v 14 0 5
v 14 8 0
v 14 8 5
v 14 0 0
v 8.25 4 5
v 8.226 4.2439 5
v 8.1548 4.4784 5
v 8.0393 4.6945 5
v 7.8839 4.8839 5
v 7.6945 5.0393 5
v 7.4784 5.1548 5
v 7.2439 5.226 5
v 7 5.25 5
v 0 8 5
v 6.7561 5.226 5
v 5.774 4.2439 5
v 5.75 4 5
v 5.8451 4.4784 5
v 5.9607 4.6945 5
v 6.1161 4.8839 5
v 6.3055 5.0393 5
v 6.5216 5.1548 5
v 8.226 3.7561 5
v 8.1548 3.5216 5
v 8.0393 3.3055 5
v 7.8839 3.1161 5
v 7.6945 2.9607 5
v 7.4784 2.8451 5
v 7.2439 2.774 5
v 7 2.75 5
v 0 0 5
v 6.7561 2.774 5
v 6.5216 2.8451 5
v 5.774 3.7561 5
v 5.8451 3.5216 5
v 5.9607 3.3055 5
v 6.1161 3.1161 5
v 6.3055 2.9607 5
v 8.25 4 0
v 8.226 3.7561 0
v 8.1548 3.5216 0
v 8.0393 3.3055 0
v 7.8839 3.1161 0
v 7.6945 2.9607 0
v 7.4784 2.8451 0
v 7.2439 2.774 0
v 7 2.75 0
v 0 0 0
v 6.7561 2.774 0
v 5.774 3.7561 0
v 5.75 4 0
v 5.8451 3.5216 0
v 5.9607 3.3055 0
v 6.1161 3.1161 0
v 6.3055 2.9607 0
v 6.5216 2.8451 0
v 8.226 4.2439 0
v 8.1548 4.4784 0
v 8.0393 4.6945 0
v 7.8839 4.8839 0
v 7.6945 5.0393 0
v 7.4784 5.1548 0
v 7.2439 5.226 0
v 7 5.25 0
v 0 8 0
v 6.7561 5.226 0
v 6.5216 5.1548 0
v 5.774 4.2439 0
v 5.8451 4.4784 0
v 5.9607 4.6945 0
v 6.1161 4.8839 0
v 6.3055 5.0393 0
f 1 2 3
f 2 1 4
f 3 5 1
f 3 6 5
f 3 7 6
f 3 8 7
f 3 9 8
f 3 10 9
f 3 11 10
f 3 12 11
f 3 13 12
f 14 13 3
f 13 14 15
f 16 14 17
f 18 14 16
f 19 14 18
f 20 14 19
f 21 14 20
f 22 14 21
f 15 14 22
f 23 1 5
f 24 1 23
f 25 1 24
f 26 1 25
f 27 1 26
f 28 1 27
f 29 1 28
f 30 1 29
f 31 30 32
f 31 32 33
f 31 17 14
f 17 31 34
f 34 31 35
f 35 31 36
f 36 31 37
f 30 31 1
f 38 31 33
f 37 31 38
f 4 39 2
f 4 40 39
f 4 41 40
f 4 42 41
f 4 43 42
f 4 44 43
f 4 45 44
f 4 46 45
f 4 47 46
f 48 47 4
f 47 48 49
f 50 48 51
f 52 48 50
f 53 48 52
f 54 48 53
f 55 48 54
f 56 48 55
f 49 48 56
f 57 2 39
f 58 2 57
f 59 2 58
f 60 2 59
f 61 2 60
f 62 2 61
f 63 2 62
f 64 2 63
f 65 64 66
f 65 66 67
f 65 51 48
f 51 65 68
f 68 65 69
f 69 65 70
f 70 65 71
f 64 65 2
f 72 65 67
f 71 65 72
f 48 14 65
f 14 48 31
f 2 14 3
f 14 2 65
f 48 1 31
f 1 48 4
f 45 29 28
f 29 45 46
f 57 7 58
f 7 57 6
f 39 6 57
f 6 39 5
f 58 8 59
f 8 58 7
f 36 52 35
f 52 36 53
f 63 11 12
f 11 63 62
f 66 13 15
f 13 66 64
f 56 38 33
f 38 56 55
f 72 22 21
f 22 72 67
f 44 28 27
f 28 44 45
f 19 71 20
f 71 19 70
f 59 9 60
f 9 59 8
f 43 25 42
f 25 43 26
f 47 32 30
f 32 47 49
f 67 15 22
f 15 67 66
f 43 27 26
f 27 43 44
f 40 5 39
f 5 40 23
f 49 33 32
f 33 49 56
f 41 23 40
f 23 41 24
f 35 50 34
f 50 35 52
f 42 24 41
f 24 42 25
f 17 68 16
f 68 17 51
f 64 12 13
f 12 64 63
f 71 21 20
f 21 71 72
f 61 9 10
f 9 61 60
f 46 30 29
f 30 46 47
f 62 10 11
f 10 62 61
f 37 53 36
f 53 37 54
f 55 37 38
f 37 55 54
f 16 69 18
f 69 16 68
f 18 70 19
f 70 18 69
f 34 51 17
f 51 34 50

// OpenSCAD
$fn = 32;

// ----------------------------------------------------------------------
// Micro pad: drilled pad, 5-20 mm class
// ----------------------------------------------------------------------

// --- parameters (mm) ---
pad_l = 14;               // pad length, X
pad_w = 8;                // pad width, Y
pad_t = 5;                // pad thickness, Z
hole_d = 2.5;             // through hole diameter

difference() {
  cube([pad_l, pad_w, pad_t]);
  translate([pad_l / 2, pad_w / 2, -1])
    cylinder(h = pad_t + 2, d = hole_d);
}
